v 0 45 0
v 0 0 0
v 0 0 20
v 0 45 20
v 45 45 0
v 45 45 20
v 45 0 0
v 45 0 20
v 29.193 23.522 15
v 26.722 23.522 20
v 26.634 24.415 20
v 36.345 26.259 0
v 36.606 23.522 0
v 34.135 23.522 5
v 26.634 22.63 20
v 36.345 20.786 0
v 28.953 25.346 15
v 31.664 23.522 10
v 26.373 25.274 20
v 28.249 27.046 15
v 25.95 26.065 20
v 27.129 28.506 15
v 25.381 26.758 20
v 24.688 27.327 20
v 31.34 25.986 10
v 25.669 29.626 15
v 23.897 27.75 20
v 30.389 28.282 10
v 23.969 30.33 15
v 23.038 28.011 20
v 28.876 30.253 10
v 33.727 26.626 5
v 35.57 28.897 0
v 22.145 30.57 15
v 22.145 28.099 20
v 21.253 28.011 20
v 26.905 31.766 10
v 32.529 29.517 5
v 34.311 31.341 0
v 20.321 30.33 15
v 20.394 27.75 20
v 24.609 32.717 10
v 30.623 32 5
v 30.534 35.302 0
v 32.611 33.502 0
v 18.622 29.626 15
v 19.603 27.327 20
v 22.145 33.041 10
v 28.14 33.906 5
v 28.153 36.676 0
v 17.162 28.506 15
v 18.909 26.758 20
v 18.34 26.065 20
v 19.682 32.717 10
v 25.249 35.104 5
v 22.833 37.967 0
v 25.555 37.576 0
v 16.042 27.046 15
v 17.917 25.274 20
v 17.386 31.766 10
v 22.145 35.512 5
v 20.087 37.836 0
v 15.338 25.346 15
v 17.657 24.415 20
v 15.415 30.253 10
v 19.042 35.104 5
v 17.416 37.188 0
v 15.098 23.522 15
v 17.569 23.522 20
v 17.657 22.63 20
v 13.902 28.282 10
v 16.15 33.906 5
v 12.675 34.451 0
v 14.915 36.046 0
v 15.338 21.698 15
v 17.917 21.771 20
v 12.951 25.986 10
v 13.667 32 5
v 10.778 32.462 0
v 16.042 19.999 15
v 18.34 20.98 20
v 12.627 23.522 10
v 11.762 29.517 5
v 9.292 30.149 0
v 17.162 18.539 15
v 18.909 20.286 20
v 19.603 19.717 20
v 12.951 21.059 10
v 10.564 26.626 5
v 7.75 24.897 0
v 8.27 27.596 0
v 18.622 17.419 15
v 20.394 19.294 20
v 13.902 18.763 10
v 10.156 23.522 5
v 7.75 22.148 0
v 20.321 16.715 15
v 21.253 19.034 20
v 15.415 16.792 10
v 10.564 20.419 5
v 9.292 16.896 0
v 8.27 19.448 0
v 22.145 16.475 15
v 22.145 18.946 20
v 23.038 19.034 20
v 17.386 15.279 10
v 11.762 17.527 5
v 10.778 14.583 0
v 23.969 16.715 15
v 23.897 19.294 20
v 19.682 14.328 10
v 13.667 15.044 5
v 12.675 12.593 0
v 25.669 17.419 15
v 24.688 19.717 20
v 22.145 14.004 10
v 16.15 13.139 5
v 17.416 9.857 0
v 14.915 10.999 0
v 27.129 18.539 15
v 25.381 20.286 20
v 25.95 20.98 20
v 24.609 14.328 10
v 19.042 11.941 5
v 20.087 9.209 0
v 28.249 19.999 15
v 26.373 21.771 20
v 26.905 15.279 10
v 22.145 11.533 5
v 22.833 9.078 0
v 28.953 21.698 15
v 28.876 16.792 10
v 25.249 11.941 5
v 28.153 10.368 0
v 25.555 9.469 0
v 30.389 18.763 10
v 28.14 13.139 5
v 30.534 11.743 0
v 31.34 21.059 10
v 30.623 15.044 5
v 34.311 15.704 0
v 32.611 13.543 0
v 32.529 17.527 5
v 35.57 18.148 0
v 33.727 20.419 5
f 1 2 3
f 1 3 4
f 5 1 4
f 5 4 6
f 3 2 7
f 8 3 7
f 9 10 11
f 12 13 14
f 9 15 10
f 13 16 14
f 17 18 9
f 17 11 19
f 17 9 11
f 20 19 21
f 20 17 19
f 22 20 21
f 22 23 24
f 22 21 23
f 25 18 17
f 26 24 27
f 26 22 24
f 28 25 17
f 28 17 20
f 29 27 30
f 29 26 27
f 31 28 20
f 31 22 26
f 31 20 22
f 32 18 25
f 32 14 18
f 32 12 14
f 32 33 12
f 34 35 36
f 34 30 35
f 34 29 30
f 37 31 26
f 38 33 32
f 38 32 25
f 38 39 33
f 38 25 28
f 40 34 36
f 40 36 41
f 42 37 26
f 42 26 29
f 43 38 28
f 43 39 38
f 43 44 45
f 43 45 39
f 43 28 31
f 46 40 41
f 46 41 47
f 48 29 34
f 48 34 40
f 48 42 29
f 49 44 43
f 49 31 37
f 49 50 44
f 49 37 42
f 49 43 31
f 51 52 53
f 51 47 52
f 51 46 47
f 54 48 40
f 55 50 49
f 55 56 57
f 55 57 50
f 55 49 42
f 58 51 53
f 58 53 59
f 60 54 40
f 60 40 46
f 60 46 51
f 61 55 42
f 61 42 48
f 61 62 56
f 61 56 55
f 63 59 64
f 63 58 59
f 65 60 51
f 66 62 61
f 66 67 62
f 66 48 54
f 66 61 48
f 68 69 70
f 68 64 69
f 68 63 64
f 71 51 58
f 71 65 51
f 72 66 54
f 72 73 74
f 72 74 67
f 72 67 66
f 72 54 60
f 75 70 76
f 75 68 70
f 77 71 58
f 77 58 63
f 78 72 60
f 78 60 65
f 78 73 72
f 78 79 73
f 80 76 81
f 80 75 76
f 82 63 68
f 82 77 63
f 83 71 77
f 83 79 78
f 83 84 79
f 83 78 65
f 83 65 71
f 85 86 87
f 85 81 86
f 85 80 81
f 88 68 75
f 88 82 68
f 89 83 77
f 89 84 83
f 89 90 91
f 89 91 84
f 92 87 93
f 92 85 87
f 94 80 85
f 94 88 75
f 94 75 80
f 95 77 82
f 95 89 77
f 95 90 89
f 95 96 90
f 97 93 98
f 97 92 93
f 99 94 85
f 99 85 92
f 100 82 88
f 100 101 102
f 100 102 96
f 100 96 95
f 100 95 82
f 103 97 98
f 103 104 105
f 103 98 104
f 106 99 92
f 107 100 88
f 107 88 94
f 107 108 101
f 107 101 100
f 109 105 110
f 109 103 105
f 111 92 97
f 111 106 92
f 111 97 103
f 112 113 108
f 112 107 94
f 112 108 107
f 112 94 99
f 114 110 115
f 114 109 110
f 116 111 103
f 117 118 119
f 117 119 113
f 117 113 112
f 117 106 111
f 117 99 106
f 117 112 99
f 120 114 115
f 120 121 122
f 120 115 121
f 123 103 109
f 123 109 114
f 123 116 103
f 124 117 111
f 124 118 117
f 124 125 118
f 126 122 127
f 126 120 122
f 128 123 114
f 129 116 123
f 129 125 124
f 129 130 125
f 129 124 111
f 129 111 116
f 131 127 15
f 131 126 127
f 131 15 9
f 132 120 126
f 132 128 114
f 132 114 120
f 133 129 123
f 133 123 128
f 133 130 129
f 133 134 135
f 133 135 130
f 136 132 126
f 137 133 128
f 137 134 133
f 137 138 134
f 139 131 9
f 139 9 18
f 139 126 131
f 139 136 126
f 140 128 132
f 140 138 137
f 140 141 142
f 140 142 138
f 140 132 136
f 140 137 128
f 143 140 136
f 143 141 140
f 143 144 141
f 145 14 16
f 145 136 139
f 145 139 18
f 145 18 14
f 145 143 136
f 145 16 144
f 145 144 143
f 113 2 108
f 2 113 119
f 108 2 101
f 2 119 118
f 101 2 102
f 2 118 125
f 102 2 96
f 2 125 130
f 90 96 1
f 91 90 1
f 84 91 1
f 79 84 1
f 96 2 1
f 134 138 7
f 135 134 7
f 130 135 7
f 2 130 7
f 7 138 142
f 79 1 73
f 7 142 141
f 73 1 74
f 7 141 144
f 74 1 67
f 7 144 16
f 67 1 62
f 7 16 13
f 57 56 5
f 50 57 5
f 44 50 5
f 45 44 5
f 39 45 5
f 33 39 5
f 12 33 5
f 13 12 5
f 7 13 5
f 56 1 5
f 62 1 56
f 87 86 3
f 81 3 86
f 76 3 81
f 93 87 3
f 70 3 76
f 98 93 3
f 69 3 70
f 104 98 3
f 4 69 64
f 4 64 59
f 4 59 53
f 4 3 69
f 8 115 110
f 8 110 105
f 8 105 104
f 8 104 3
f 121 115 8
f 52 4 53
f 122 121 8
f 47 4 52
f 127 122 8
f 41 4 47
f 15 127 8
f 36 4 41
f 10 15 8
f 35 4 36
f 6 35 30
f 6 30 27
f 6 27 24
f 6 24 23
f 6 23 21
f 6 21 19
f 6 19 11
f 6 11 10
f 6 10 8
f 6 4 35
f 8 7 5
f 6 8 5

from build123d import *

# Parameters (mm, degrees)
F0_W     = 45
F0_H     = 45
F1_DEPTH = 20
F2_R     = 4.5763469256
F3_DEPTH = 25
F3_TAPER = -26.3


with BuildPart() as f1:
    # F0 (on Top) → F1 (new body)
    with BuildSketch(Plane.XY):
        with Locations((22.5, 22.5)):
            Rectangle(F0_W, F0_H)
    extrude(amount=F1_DEPTH)

    # F2 (on face) → F3 (cut)
    with BuildSketch(Plane.XY.offset(20)):
        with Locations((22.1453737468, 23.5223285854)):
            Circle(F2_R)
    extrude(amount=-F3_DEPTH, taper=F3_TAPER, mode=Mode.SUBTRACT)


solid = f1.part
